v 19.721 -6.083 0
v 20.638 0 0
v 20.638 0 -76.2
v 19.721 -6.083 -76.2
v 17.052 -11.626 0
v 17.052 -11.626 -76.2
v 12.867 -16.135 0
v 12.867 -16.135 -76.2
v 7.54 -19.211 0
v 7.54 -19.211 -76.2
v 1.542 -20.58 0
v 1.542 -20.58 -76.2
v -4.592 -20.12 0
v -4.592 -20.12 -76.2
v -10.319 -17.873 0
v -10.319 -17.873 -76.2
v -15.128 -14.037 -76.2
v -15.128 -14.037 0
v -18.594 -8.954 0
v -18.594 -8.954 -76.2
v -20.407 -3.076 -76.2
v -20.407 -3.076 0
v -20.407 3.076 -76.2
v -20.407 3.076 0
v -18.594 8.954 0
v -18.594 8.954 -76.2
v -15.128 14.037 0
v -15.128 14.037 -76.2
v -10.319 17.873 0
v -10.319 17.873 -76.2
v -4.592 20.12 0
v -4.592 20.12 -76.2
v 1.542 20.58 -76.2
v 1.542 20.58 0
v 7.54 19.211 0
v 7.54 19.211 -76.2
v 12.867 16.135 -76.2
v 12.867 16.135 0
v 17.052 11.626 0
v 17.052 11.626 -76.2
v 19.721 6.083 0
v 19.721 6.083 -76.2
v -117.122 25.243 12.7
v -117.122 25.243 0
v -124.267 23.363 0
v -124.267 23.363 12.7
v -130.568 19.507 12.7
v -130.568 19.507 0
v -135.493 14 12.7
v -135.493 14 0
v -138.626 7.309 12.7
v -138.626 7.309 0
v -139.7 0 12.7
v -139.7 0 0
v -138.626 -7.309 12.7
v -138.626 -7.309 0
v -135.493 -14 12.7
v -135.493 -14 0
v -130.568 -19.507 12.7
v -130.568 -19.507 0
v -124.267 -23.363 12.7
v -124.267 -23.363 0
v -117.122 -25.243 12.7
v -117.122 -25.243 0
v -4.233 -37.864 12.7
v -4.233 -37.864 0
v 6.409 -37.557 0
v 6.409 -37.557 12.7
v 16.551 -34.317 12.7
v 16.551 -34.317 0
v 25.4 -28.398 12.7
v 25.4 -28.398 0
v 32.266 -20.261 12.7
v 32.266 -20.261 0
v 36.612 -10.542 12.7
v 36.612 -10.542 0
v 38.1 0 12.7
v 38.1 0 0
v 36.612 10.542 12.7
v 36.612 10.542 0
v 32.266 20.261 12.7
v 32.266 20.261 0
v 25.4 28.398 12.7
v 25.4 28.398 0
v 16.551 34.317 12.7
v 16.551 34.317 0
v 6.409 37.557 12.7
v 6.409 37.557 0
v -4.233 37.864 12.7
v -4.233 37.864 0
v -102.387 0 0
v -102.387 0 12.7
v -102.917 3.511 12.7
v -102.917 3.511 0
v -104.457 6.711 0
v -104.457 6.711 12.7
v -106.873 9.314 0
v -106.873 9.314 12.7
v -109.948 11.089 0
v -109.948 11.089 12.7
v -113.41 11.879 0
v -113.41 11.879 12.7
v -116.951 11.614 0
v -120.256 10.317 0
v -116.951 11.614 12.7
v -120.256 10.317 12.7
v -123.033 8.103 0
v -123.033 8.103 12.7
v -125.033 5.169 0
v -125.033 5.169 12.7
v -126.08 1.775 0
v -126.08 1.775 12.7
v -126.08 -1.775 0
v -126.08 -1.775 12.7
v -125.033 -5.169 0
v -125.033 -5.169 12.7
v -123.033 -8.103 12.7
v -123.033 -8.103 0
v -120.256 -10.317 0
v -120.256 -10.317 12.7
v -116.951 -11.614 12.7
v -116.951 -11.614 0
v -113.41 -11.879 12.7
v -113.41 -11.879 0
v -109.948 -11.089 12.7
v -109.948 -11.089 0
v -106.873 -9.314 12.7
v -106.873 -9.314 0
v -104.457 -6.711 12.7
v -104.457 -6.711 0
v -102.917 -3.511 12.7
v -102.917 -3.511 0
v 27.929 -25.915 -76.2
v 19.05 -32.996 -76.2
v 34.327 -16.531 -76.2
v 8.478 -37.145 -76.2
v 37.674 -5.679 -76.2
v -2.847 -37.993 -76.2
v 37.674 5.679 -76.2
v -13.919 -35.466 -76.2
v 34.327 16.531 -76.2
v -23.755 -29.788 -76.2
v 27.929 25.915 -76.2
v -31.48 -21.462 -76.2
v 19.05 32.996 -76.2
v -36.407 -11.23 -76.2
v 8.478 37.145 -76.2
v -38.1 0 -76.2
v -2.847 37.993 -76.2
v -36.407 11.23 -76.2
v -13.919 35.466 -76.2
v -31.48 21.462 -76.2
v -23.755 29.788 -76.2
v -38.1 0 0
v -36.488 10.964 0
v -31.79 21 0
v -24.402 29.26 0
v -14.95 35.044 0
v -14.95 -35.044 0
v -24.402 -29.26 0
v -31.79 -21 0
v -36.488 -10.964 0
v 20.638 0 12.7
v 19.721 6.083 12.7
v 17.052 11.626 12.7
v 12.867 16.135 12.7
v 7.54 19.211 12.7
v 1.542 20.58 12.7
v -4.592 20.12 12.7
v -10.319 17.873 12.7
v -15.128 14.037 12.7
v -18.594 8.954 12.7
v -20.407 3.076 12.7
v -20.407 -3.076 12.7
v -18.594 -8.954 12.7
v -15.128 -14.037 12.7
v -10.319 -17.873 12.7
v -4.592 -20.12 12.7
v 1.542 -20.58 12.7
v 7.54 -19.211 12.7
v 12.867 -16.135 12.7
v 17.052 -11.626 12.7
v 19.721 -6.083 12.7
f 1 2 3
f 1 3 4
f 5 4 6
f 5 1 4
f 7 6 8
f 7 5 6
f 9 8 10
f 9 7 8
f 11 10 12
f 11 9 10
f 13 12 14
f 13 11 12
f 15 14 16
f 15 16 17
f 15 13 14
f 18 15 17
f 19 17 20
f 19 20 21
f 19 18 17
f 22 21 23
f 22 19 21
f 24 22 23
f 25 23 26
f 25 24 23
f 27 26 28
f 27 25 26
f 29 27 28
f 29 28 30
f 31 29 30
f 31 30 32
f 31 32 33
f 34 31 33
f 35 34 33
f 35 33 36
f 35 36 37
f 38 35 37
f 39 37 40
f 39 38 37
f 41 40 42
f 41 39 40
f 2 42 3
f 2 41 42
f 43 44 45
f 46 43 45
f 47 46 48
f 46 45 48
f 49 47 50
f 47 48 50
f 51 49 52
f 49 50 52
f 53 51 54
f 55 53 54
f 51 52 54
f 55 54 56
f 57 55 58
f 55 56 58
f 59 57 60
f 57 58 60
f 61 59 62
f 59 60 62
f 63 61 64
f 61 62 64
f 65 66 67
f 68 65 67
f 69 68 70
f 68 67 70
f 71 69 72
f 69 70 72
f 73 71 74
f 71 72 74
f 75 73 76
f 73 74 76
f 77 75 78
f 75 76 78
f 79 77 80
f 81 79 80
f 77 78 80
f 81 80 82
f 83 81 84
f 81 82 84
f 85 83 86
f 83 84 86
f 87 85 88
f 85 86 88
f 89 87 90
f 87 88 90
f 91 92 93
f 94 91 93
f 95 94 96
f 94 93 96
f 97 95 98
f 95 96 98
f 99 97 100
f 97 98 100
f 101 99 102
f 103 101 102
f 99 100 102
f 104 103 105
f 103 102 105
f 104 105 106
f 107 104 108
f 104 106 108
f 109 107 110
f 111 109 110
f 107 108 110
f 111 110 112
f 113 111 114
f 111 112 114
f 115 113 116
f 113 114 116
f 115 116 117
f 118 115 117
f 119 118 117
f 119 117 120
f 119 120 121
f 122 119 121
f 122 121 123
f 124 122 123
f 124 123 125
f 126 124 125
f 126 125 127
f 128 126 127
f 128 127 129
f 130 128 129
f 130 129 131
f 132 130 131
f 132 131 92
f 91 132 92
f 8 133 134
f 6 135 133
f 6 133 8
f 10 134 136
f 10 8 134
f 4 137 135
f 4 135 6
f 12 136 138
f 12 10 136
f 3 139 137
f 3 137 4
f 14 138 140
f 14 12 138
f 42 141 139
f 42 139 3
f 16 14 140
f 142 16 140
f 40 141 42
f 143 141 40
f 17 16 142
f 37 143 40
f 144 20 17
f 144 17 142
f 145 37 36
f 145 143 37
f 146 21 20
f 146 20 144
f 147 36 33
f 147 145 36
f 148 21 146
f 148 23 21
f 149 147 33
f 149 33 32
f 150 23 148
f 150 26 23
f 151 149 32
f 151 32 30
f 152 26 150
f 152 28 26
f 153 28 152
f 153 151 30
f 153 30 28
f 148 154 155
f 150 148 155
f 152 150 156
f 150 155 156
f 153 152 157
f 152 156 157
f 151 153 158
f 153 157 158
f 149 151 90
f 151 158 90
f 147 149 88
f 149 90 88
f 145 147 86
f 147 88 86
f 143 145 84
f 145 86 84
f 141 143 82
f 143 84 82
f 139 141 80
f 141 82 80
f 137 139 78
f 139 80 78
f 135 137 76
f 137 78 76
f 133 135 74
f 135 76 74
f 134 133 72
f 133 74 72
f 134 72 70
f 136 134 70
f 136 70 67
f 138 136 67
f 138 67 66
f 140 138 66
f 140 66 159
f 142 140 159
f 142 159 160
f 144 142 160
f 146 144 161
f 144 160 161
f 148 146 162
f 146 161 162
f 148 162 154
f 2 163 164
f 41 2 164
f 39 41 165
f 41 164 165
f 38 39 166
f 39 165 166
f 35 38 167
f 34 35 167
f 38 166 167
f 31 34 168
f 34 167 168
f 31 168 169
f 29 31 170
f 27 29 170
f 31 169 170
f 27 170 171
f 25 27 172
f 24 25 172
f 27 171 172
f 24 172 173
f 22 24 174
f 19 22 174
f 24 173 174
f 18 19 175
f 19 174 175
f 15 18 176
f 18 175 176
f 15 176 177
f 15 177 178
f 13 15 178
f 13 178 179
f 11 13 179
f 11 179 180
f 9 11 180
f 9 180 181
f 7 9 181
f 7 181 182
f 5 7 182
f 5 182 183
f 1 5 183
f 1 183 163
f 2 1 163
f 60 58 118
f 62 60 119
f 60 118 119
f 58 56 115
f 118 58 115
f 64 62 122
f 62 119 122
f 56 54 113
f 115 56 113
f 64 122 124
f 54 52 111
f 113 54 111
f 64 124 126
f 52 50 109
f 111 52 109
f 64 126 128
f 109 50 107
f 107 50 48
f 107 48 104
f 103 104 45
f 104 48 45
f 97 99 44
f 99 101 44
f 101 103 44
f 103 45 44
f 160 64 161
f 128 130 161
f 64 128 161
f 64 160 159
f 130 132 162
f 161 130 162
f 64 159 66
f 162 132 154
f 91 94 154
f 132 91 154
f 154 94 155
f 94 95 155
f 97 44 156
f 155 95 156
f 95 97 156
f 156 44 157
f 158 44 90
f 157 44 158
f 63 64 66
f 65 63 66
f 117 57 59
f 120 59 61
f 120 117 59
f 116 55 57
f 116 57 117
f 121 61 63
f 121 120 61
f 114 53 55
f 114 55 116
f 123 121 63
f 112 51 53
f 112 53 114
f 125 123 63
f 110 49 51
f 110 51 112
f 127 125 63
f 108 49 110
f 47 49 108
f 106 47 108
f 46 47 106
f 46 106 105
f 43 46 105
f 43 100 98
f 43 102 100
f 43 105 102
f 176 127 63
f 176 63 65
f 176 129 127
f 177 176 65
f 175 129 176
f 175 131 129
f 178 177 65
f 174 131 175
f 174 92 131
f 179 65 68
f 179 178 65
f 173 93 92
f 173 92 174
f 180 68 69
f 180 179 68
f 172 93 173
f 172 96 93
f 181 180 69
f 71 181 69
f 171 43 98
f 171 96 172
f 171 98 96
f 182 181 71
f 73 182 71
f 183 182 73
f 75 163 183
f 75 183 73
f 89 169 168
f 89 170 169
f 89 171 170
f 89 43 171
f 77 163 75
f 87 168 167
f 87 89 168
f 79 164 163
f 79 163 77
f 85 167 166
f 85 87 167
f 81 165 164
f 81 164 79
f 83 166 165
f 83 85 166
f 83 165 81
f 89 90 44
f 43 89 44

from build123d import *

# Parameters (mm, degrees)
BOSS_EXTRUDE1_DEPTH                                 = 12.7
CBORE_FOR_0_BINDING_HEAD_MACHINE_SCREW1_D           = 15.875
CBORE_FOR_0_BINDING_HEAD_MACHINE_SCREW1_CBORE_D     = 23.8252
CBORE_FOR_0_BINDING_HEAD_MACHINE_SCREW1_CBORE_DEPTH = 15.875
SKETCH9_R                                           = 20.6375
CUT_EXTRUDE2_DEPTH                                  = 146.358143907
SKETCH11_R                                          = 38.1
SKETCH11_R_2                                        = 20.6375
BOSS_EXTRUDE2_DEPTH                                 = 76.2


with BuildPart() as part:
    # Sketch1 → Boss-Extrude1 (new body)
    with BuildSketch(Plane.XY):
        with BuildLine():
            ThreePointArc((-117.122222222, 25.242722946), (-139.7, 0), (-117.122222222, -25.242722946))
            Line((-117.122222222, -25.242722946), (-4.233333333, -37.864084419))
            ThreePointArc((-4.233333333, -37.864084419), (38.1, 0), (-4.233333333, 37.864084419))
            Line((-4.233333333, 37.864084419), (-117.122222222, 25.242722946))
        make_face()
    extrude(amount=BOSS_EXTRUDE1_DEPTH)

    # CBORE for #0 Binding Head Machine Screw1 (through all)
    with Locations(Plane.XY.offset(12.7)):
        with Locations((-114.3, 0)):
            CounterBoreHole(CBORE_FOR_0_BINDING_HEAD_MACHINE_SCREW1_D / 2, CBORE_FOR_0_BINDING_HEAD_MACHINE_SCREW1_CBORE_D / 2, CBORE_FOR_0_BINDING_HEAD_MACHINE_SCREW1_CBORE_DEPTH)

    # Sketch9 → Cut-Extrude2 (cut, through all)
    with BuildSketch(Plane.XY.offset(12.7)):
        Circle(SKETCH9_R)
    extrude(amount=-CUT_EXTRUDE2_DEPTH, mode=Mode.SUBTRACT)

    # Sketch11 → Boss-Extrude2 (add)
    with BuildSketch(Plane(origin=(0, 0, 0), x_dir=(-1, 0, 0), z_dir=(0, 0, -1))):
        Circle(SKETCH11_R)
        with Locations(Location((0, 0, 0), (0, 0, 180))):
            Circle(SKETCH11_R_2, mode=Mode.SUBTRACT)
    extrude(amount=BOSS_EXTRUDE2_DEPTH)


solid = part.part
